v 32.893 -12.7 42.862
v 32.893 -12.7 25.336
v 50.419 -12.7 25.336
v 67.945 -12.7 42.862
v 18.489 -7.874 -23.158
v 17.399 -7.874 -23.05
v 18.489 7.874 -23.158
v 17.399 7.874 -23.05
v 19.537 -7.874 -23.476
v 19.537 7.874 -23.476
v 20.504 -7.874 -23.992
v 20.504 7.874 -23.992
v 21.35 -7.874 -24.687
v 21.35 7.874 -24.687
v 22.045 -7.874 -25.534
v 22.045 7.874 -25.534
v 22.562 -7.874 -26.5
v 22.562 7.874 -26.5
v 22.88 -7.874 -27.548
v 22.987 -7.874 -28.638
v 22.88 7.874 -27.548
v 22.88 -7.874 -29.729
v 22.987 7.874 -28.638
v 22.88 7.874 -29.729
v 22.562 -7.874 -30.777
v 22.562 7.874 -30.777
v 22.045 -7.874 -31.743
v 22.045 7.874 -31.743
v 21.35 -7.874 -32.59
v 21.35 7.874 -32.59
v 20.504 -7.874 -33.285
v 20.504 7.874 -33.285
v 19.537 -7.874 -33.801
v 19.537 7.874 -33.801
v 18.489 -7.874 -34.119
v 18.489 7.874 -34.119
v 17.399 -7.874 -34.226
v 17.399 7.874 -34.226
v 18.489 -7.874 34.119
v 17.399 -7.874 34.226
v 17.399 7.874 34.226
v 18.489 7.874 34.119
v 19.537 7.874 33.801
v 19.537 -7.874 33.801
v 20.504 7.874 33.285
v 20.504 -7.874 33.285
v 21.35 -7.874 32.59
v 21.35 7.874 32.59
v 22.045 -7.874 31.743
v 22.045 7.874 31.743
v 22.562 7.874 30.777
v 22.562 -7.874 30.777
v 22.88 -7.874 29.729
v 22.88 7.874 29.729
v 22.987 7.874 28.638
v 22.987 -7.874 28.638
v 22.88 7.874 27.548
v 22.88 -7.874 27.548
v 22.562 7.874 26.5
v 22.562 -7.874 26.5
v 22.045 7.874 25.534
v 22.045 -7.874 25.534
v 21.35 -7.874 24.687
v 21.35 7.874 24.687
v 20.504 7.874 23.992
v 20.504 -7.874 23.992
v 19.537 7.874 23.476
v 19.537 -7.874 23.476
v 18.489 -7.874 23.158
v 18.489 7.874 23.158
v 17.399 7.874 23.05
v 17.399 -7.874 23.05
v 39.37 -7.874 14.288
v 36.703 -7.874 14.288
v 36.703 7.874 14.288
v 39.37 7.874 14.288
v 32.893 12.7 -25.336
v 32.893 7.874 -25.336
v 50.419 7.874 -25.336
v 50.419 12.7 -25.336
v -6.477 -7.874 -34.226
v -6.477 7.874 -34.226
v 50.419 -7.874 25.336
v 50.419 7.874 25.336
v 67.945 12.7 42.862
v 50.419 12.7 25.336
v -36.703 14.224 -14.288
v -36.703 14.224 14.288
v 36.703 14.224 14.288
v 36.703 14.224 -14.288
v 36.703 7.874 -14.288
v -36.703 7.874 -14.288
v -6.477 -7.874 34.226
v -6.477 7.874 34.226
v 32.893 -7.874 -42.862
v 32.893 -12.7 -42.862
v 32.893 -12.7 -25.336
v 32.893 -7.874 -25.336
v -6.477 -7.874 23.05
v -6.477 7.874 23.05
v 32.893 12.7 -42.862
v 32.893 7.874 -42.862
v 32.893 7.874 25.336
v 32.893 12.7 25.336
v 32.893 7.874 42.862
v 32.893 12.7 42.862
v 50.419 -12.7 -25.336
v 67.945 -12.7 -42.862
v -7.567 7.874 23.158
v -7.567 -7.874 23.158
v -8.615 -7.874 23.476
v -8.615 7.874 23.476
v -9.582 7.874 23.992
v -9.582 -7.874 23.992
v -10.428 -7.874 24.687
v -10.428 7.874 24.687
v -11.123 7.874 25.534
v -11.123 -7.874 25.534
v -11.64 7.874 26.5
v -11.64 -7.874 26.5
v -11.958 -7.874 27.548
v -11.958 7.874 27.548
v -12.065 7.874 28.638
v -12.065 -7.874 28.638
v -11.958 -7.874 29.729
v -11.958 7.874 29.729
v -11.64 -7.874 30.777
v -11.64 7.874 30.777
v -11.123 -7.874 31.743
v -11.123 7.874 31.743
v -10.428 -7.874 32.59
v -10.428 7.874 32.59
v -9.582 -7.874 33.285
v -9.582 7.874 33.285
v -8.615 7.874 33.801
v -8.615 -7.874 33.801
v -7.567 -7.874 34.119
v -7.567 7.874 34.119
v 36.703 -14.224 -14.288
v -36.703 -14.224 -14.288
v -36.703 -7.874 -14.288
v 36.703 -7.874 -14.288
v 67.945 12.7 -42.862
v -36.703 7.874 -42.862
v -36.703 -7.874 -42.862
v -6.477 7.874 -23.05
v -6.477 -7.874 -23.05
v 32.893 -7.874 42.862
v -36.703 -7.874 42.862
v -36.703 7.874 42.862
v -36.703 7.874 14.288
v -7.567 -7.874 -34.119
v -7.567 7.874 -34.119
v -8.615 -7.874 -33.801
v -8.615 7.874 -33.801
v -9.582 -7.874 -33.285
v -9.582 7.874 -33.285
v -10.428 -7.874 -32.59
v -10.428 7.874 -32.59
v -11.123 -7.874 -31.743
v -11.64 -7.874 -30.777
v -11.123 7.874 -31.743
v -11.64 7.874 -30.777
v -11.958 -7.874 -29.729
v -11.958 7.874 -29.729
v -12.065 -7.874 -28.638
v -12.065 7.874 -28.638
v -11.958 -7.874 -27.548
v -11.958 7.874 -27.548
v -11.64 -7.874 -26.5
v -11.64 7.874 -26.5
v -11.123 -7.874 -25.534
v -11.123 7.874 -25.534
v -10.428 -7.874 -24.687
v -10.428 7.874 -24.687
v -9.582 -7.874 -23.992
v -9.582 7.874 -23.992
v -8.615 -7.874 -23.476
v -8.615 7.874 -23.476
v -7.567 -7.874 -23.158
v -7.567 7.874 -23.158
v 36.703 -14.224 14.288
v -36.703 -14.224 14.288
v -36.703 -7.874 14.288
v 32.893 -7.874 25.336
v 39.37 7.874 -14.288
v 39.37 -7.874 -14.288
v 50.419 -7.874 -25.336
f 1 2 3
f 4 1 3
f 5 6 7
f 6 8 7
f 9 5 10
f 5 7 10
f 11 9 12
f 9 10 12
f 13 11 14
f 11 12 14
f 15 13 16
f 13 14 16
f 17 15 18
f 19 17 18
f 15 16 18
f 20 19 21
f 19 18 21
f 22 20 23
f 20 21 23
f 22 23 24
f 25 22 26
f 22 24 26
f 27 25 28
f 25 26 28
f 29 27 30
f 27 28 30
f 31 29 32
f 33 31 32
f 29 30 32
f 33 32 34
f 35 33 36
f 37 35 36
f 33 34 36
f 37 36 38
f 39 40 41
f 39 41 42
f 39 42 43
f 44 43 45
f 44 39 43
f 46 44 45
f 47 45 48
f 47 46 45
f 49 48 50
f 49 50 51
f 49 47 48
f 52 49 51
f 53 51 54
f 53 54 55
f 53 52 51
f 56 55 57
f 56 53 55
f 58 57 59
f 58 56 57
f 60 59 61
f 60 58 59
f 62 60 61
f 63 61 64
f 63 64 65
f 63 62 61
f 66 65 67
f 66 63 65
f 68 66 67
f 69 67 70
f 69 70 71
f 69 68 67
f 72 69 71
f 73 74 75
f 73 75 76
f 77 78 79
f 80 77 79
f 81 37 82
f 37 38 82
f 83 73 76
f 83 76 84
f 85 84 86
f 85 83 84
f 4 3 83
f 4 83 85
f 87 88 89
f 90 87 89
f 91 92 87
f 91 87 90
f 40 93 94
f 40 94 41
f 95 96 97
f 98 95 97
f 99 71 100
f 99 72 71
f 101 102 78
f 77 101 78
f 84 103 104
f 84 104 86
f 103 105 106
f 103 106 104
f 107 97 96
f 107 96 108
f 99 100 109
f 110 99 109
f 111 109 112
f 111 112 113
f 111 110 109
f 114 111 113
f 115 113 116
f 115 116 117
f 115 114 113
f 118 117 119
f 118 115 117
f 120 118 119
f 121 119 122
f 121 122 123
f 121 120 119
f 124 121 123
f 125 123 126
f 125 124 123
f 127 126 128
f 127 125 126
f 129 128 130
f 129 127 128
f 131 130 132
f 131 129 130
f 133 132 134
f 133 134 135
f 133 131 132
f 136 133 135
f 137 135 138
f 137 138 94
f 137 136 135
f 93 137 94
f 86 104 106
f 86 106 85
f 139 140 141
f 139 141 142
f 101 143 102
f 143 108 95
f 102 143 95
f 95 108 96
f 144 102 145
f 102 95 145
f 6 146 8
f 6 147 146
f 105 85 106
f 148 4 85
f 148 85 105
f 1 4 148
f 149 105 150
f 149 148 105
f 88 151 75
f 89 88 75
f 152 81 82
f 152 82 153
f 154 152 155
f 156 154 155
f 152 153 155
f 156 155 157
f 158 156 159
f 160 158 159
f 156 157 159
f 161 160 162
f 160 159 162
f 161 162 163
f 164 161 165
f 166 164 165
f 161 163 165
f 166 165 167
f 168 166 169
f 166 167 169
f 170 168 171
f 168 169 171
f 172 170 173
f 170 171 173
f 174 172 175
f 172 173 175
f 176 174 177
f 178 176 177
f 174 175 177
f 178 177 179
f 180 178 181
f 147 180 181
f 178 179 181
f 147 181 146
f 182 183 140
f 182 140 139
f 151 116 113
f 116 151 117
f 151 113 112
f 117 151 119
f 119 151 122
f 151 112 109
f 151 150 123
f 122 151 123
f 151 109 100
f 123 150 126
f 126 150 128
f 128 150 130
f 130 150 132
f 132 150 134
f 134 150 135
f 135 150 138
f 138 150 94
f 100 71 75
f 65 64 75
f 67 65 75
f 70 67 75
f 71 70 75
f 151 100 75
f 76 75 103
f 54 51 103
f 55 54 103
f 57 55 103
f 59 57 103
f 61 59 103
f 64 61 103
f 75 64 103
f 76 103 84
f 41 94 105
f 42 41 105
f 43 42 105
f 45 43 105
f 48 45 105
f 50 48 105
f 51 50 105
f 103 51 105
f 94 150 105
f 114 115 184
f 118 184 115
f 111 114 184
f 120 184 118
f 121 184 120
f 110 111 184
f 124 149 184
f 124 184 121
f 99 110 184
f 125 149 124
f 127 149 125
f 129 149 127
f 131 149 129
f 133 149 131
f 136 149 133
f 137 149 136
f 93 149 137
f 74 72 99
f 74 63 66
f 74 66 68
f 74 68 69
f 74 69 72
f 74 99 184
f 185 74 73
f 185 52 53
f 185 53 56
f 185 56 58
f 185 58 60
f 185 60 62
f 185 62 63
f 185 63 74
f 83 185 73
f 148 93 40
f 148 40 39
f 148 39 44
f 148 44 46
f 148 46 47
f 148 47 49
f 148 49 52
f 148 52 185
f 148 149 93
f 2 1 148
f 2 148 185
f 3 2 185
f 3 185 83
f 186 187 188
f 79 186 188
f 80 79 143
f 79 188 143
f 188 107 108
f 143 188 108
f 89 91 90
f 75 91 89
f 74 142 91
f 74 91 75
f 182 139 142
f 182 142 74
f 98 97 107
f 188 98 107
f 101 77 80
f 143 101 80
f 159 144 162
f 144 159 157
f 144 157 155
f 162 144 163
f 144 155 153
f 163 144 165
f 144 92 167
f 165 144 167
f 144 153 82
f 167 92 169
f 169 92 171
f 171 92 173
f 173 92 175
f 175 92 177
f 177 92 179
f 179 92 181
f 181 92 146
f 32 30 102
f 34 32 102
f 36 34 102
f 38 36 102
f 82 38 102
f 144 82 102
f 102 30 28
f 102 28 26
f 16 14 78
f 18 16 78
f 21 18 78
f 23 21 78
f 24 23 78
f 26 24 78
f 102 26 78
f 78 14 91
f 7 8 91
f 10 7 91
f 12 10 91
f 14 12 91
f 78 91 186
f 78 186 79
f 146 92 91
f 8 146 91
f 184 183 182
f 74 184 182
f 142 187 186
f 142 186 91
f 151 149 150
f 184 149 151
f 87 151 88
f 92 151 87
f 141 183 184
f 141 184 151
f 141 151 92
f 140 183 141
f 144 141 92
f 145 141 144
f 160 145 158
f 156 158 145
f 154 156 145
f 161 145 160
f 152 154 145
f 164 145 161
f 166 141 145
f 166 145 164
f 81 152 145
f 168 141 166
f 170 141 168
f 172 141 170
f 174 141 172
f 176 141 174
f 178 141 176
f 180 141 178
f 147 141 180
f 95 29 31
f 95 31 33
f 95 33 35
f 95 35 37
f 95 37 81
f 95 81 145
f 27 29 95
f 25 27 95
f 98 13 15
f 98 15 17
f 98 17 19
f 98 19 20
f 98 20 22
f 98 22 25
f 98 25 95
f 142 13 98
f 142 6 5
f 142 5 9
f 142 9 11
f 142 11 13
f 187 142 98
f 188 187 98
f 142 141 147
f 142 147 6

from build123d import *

# Parameters (mm, degrees)
F0_W     = 73.406
F0_H     = 28.575
F2_DEPTH = 14.224
F4_DEPTH = 7.874
F5_DEPTH = 12.7


# Not quite as in the source:
# - a pattern or mirror of a feature is missing from the dataset's text; its kind, count and spacing are read off the source's solid
# - a feature names something its author has since deleted; it is built from what else it names


with BuildPart() as f2:
    # F0 (on Front) → F2 (new body, symmetric)
    with BuildSketch(Plane.XZ):
        Rectangle(F0_W, F0_H)
    extrude(amount=F2_DEPTH, both=True)

    # F3 (on Front) → F4 (join, symmetric)
    with BuildSketch(Plane.XZ):
        Polygon((-36.703, -14.2875), (-36.703, -42.8625), (67.945, -42.8625), (39.37, -14.2875), align=None)
        with BuildLine():
            Line((-6.477, -23.0505), (17.399, -23.0505))
            ThreePointArc((17.399, -23.0505), (21.3503126933, -24.6871873067), (22.987, -28.6385))
            ThreePointArc((22.987, -28.6385), (21.3503126933, -32.5898126933), (17.399, -34.2265))
            Line((17.399, -34.2265), (-6.477, -34.2265))
            ThreePointArc((-6.477, -34.2265), (-12.065, -28.6385), (-6.477, -23.0505))
        make_face(mode=Mode.SUBTRACT)
        Polygon((-36.703, 14.2875), (36.703, 14.2875), (39.37, 14.2875), (50.419, 25.3365), (32.893, 25.3365), (32.893, 42.8625), (-36.703, 42.8625), align=None)
        with BuildLine():
            ThreePointArc((-6.477, 23.0505), (-12.065, 28.6385), (-6.477, 34.2265))
            Line((-6.477, 34.2265), (17.399, 34.2265))
            ThreePointArc((17.399, 34.2265), (21.3503126933, 32.5898126933), (22.987, 28.6385))
            ThreePointArc((22.987, 28.6385), (21.3503126933, 24.6871873067), (17.399, 23.0505))
            Line((17.399, 23.0505), (-6.477, 23.0505))
        make_face(mode=Mode.SUBTRACT)
        Polygon((32.893, 25.3365), (50.419, 25.3365), (67.945, 42.8625), (32.893, 42.8625), align=None)
    extrude(amount=F4_DEPTH, both=True)

    # F3 (on Front) → F5 (join, symmetric)
    with BuildSketch(Plane.XZ):
        Polygon((32.893, 25.3365), (50.419, 25.3365), (67.945, 42.8625), (32.893, 42.8625), align=None)
    f5 = extrude(amount=F5_DEPTH, both=True)

    # F5_copies: F5 across plane
    add(f5.mirror(Plane(origin=(0, 0, 0), x_dir=(-1, 0, 0), z_dir=(0, 0, -1))))


solid = f2.part
